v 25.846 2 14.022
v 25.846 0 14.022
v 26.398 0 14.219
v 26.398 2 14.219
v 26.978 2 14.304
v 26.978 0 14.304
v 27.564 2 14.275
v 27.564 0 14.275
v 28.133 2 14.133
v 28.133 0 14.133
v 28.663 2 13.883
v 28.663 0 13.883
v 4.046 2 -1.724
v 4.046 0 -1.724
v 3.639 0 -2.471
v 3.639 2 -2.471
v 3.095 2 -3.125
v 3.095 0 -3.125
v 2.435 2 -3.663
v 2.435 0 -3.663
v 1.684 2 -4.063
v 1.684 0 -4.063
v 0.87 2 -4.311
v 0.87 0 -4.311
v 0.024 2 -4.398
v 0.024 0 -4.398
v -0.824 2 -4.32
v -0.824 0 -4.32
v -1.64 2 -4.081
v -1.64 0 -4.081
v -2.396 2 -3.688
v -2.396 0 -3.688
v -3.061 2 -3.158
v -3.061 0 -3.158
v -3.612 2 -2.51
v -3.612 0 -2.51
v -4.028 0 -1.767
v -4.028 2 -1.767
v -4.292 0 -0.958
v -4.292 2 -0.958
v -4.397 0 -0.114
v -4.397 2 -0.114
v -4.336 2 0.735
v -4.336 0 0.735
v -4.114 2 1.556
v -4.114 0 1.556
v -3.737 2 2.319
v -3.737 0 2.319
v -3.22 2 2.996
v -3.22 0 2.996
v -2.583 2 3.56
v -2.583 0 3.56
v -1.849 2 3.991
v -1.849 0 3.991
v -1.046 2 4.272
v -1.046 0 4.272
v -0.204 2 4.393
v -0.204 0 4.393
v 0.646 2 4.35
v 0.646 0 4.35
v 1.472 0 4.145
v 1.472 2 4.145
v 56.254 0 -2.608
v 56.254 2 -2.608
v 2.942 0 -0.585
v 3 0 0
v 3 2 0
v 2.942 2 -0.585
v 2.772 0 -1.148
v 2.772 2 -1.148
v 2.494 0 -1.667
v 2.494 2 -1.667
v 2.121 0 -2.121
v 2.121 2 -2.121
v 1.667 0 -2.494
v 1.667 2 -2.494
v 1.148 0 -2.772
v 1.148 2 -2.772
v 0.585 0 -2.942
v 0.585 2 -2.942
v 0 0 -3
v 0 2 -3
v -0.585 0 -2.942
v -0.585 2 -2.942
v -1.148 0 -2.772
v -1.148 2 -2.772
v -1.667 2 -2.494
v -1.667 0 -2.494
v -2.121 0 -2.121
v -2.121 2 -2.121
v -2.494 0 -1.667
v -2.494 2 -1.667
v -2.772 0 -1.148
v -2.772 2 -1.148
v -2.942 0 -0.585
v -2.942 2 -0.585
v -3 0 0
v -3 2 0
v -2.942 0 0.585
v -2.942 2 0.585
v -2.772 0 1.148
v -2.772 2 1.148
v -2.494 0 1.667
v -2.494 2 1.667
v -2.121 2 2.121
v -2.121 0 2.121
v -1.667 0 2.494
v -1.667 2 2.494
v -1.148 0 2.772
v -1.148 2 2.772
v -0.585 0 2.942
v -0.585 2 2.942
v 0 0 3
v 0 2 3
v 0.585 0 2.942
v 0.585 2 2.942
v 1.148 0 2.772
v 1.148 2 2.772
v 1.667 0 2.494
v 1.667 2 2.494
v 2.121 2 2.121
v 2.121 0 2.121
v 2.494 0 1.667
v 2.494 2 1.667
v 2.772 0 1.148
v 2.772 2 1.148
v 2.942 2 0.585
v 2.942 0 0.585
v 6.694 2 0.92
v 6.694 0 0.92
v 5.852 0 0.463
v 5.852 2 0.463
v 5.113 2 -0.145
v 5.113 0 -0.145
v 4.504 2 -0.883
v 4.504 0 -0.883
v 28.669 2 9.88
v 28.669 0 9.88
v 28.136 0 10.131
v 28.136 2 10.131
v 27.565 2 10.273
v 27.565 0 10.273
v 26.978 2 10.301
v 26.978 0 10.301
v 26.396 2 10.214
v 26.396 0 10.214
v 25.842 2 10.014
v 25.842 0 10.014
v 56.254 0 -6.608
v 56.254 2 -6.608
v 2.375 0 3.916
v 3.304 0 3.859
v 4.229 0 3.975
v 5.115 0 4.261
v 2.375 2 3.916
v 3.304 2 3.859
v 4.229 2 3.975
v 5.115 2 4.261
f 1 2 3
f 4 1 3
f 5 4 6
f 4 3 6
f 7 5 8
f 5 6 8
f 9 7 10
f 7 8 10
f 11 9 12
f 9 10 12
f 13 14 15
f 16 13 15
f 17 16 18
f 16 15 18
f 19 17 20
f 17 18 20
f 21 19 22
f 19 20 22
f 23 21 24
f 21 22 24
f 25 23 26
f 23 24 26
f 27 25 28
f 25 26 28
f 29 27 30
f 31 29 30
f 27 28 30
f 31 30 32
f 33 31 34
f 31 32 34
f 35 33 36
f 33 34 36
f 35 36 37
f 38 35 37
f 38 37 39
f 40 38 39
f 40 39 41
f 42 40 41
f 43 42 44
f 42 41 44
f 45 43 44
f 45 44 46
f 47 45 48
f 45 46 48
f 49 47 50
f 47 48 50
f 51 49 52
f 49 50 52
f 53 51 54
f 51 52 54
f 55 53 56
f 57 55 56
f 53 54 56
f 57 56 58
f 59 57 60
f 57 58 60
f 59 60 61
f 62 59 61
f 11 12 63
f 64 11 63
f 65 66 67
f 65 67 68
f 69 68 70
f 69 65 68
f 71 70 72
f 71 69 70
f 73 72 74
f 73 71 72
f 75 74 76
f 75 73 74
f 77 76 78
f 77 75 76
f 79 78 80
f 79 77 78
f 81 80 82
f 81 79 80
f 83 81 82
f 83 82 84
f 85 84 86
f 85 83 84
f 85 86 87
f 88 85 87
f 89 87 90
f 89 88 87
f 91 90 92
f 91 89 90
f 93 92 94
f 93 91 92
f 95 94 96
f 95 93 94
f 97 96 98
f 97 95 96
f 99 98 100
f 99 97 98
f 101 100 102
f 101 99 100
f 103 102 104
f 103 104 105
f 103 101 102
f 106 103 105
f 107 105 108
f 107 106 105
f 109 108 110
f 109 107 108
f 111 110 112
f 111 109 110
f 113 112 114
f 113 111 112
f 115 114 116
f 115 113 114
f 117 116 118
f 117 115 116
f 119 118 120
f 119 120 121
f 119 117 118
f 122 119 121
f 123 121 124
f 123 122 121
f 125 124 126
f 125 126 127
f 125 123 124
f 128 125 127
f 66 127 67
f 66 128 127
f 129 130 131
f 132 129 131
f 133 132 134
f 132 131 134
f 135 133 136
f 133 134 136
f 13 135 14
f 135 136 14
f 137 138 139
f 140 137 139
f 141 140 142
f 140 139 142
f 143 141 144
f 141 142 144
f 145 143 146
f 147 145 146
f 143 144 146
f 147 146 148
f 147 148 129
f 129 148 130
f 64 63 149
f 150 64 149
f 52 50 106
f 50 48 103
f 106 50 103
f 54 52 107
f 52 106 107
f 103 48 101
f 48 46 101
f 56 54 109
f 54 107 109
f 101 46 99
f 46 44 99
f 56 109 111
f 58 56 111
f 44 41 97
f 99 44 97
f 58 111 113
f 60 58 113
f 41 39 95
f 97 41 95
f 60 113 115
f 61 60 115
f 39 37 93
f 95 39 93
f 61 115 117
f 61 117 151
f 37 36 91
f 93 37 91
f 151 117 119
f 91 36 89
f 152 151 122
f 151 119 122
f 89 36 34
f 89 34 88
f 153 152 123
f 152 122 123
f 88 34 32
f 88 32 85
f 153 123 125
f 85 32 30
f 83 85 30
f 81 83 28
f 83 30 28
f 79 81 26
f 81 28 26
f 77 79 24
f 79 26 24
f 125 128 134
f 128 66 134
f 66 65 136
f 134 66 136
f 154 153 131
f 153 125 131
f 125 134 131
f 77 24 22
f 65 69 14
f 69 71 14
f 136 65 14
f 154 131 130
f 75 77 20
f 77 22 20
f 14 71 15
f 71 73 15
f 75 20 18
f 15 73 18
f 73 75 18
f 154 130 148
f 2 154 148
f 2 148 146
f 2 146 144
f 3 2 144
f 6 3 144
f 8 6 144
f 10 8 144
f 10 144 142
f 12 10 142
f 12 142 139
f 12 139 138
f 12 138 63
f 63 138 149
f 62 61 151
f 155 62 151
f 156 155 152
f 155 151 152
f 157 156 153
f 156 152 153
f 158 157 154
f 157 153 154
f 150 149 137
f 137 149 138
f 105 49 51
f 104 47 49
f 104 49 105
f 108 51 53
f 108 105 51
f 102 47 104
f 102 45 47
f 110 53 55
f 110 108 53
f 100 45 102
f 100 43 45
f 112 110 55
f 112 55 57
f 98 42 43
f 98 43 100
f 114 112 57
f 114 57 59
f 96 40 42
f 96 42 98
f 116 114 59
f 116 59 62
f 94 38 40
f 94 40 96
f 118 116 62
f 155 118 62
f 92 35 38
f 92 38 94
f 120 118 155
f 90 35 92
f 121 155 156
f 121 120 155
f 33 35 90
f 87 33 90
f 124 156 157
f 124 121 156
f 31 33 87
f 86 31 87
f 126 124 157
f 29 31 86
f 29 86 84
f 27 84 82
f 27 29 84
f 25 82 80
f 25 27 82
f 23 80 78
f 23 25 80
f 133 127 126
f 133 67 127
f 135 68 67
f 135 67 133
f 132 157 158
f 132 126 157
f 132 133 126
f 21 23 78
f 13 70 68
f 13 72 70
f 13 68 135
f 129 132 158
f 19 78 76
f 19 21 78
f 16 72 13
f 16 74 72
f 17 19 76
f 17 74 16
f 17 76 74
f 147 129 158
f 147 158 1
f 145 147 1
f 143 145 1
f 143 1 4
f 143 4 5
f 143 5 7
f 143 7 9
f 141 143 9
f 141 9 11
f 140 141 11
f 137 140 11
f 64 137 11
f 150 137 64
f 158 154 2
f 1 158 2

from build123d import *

# Parameters (mm, degrees)
SKETCH1_R           = 3
BOSS_EXTRUDE1_DEPTH = 2


with BuildPart() as part:
    # Sketch1 → Boss-Extrude1 (new body)
    with BuildSketch(Plane(origin=(0, 0, 0), x_dir=(1, 0, 0), z_dir=(0, 1, 0))):
        with BuildLine():
            Line((25.842346039, -10.014425763), (6.693666426, -0.919624764))
            ThreePointArc((6.693666426, -0.919624764), (5.113423812, 0.145118135), (4.046267677, 1.723732067))
            ThreePointArc((4.046267677, 1.723732067), (-4.027578724, 1.766958961), (1.471755352, -4.144571212))
            ThreePointArc((1.471755352, -4.144571212), (3.304406882, -3.858859691), (5.115110957, -4.26084658))
            Line((5.115110957, -4.26084658), (25.845891994, -14.02203976))
            ThreePointArc((25.845891994, -14.02203976), (27.271804068, -14.304213396), (28.662988426, -13.882961353))
            Line((28.662988426, -13.882961353), (56.254370384, 2.608150475))
            Line((56.254370384, 2.608150475), (56.254370384, 6.608150475))
            Line((56.254370384, 6.608150475), (28.668534032, -9.879646796))
            ThreePointArc((28.668534032, -9.879646796), (27.272327122, -10.30114258), (25.842346039, -10.014425763))
        make_face()
        Circle(SKETCH1_R, mode=Mode.SUBTRACT)
    extrude(amount=BOSS_EXTRUDE1_DEPTH)


solid = part.part
